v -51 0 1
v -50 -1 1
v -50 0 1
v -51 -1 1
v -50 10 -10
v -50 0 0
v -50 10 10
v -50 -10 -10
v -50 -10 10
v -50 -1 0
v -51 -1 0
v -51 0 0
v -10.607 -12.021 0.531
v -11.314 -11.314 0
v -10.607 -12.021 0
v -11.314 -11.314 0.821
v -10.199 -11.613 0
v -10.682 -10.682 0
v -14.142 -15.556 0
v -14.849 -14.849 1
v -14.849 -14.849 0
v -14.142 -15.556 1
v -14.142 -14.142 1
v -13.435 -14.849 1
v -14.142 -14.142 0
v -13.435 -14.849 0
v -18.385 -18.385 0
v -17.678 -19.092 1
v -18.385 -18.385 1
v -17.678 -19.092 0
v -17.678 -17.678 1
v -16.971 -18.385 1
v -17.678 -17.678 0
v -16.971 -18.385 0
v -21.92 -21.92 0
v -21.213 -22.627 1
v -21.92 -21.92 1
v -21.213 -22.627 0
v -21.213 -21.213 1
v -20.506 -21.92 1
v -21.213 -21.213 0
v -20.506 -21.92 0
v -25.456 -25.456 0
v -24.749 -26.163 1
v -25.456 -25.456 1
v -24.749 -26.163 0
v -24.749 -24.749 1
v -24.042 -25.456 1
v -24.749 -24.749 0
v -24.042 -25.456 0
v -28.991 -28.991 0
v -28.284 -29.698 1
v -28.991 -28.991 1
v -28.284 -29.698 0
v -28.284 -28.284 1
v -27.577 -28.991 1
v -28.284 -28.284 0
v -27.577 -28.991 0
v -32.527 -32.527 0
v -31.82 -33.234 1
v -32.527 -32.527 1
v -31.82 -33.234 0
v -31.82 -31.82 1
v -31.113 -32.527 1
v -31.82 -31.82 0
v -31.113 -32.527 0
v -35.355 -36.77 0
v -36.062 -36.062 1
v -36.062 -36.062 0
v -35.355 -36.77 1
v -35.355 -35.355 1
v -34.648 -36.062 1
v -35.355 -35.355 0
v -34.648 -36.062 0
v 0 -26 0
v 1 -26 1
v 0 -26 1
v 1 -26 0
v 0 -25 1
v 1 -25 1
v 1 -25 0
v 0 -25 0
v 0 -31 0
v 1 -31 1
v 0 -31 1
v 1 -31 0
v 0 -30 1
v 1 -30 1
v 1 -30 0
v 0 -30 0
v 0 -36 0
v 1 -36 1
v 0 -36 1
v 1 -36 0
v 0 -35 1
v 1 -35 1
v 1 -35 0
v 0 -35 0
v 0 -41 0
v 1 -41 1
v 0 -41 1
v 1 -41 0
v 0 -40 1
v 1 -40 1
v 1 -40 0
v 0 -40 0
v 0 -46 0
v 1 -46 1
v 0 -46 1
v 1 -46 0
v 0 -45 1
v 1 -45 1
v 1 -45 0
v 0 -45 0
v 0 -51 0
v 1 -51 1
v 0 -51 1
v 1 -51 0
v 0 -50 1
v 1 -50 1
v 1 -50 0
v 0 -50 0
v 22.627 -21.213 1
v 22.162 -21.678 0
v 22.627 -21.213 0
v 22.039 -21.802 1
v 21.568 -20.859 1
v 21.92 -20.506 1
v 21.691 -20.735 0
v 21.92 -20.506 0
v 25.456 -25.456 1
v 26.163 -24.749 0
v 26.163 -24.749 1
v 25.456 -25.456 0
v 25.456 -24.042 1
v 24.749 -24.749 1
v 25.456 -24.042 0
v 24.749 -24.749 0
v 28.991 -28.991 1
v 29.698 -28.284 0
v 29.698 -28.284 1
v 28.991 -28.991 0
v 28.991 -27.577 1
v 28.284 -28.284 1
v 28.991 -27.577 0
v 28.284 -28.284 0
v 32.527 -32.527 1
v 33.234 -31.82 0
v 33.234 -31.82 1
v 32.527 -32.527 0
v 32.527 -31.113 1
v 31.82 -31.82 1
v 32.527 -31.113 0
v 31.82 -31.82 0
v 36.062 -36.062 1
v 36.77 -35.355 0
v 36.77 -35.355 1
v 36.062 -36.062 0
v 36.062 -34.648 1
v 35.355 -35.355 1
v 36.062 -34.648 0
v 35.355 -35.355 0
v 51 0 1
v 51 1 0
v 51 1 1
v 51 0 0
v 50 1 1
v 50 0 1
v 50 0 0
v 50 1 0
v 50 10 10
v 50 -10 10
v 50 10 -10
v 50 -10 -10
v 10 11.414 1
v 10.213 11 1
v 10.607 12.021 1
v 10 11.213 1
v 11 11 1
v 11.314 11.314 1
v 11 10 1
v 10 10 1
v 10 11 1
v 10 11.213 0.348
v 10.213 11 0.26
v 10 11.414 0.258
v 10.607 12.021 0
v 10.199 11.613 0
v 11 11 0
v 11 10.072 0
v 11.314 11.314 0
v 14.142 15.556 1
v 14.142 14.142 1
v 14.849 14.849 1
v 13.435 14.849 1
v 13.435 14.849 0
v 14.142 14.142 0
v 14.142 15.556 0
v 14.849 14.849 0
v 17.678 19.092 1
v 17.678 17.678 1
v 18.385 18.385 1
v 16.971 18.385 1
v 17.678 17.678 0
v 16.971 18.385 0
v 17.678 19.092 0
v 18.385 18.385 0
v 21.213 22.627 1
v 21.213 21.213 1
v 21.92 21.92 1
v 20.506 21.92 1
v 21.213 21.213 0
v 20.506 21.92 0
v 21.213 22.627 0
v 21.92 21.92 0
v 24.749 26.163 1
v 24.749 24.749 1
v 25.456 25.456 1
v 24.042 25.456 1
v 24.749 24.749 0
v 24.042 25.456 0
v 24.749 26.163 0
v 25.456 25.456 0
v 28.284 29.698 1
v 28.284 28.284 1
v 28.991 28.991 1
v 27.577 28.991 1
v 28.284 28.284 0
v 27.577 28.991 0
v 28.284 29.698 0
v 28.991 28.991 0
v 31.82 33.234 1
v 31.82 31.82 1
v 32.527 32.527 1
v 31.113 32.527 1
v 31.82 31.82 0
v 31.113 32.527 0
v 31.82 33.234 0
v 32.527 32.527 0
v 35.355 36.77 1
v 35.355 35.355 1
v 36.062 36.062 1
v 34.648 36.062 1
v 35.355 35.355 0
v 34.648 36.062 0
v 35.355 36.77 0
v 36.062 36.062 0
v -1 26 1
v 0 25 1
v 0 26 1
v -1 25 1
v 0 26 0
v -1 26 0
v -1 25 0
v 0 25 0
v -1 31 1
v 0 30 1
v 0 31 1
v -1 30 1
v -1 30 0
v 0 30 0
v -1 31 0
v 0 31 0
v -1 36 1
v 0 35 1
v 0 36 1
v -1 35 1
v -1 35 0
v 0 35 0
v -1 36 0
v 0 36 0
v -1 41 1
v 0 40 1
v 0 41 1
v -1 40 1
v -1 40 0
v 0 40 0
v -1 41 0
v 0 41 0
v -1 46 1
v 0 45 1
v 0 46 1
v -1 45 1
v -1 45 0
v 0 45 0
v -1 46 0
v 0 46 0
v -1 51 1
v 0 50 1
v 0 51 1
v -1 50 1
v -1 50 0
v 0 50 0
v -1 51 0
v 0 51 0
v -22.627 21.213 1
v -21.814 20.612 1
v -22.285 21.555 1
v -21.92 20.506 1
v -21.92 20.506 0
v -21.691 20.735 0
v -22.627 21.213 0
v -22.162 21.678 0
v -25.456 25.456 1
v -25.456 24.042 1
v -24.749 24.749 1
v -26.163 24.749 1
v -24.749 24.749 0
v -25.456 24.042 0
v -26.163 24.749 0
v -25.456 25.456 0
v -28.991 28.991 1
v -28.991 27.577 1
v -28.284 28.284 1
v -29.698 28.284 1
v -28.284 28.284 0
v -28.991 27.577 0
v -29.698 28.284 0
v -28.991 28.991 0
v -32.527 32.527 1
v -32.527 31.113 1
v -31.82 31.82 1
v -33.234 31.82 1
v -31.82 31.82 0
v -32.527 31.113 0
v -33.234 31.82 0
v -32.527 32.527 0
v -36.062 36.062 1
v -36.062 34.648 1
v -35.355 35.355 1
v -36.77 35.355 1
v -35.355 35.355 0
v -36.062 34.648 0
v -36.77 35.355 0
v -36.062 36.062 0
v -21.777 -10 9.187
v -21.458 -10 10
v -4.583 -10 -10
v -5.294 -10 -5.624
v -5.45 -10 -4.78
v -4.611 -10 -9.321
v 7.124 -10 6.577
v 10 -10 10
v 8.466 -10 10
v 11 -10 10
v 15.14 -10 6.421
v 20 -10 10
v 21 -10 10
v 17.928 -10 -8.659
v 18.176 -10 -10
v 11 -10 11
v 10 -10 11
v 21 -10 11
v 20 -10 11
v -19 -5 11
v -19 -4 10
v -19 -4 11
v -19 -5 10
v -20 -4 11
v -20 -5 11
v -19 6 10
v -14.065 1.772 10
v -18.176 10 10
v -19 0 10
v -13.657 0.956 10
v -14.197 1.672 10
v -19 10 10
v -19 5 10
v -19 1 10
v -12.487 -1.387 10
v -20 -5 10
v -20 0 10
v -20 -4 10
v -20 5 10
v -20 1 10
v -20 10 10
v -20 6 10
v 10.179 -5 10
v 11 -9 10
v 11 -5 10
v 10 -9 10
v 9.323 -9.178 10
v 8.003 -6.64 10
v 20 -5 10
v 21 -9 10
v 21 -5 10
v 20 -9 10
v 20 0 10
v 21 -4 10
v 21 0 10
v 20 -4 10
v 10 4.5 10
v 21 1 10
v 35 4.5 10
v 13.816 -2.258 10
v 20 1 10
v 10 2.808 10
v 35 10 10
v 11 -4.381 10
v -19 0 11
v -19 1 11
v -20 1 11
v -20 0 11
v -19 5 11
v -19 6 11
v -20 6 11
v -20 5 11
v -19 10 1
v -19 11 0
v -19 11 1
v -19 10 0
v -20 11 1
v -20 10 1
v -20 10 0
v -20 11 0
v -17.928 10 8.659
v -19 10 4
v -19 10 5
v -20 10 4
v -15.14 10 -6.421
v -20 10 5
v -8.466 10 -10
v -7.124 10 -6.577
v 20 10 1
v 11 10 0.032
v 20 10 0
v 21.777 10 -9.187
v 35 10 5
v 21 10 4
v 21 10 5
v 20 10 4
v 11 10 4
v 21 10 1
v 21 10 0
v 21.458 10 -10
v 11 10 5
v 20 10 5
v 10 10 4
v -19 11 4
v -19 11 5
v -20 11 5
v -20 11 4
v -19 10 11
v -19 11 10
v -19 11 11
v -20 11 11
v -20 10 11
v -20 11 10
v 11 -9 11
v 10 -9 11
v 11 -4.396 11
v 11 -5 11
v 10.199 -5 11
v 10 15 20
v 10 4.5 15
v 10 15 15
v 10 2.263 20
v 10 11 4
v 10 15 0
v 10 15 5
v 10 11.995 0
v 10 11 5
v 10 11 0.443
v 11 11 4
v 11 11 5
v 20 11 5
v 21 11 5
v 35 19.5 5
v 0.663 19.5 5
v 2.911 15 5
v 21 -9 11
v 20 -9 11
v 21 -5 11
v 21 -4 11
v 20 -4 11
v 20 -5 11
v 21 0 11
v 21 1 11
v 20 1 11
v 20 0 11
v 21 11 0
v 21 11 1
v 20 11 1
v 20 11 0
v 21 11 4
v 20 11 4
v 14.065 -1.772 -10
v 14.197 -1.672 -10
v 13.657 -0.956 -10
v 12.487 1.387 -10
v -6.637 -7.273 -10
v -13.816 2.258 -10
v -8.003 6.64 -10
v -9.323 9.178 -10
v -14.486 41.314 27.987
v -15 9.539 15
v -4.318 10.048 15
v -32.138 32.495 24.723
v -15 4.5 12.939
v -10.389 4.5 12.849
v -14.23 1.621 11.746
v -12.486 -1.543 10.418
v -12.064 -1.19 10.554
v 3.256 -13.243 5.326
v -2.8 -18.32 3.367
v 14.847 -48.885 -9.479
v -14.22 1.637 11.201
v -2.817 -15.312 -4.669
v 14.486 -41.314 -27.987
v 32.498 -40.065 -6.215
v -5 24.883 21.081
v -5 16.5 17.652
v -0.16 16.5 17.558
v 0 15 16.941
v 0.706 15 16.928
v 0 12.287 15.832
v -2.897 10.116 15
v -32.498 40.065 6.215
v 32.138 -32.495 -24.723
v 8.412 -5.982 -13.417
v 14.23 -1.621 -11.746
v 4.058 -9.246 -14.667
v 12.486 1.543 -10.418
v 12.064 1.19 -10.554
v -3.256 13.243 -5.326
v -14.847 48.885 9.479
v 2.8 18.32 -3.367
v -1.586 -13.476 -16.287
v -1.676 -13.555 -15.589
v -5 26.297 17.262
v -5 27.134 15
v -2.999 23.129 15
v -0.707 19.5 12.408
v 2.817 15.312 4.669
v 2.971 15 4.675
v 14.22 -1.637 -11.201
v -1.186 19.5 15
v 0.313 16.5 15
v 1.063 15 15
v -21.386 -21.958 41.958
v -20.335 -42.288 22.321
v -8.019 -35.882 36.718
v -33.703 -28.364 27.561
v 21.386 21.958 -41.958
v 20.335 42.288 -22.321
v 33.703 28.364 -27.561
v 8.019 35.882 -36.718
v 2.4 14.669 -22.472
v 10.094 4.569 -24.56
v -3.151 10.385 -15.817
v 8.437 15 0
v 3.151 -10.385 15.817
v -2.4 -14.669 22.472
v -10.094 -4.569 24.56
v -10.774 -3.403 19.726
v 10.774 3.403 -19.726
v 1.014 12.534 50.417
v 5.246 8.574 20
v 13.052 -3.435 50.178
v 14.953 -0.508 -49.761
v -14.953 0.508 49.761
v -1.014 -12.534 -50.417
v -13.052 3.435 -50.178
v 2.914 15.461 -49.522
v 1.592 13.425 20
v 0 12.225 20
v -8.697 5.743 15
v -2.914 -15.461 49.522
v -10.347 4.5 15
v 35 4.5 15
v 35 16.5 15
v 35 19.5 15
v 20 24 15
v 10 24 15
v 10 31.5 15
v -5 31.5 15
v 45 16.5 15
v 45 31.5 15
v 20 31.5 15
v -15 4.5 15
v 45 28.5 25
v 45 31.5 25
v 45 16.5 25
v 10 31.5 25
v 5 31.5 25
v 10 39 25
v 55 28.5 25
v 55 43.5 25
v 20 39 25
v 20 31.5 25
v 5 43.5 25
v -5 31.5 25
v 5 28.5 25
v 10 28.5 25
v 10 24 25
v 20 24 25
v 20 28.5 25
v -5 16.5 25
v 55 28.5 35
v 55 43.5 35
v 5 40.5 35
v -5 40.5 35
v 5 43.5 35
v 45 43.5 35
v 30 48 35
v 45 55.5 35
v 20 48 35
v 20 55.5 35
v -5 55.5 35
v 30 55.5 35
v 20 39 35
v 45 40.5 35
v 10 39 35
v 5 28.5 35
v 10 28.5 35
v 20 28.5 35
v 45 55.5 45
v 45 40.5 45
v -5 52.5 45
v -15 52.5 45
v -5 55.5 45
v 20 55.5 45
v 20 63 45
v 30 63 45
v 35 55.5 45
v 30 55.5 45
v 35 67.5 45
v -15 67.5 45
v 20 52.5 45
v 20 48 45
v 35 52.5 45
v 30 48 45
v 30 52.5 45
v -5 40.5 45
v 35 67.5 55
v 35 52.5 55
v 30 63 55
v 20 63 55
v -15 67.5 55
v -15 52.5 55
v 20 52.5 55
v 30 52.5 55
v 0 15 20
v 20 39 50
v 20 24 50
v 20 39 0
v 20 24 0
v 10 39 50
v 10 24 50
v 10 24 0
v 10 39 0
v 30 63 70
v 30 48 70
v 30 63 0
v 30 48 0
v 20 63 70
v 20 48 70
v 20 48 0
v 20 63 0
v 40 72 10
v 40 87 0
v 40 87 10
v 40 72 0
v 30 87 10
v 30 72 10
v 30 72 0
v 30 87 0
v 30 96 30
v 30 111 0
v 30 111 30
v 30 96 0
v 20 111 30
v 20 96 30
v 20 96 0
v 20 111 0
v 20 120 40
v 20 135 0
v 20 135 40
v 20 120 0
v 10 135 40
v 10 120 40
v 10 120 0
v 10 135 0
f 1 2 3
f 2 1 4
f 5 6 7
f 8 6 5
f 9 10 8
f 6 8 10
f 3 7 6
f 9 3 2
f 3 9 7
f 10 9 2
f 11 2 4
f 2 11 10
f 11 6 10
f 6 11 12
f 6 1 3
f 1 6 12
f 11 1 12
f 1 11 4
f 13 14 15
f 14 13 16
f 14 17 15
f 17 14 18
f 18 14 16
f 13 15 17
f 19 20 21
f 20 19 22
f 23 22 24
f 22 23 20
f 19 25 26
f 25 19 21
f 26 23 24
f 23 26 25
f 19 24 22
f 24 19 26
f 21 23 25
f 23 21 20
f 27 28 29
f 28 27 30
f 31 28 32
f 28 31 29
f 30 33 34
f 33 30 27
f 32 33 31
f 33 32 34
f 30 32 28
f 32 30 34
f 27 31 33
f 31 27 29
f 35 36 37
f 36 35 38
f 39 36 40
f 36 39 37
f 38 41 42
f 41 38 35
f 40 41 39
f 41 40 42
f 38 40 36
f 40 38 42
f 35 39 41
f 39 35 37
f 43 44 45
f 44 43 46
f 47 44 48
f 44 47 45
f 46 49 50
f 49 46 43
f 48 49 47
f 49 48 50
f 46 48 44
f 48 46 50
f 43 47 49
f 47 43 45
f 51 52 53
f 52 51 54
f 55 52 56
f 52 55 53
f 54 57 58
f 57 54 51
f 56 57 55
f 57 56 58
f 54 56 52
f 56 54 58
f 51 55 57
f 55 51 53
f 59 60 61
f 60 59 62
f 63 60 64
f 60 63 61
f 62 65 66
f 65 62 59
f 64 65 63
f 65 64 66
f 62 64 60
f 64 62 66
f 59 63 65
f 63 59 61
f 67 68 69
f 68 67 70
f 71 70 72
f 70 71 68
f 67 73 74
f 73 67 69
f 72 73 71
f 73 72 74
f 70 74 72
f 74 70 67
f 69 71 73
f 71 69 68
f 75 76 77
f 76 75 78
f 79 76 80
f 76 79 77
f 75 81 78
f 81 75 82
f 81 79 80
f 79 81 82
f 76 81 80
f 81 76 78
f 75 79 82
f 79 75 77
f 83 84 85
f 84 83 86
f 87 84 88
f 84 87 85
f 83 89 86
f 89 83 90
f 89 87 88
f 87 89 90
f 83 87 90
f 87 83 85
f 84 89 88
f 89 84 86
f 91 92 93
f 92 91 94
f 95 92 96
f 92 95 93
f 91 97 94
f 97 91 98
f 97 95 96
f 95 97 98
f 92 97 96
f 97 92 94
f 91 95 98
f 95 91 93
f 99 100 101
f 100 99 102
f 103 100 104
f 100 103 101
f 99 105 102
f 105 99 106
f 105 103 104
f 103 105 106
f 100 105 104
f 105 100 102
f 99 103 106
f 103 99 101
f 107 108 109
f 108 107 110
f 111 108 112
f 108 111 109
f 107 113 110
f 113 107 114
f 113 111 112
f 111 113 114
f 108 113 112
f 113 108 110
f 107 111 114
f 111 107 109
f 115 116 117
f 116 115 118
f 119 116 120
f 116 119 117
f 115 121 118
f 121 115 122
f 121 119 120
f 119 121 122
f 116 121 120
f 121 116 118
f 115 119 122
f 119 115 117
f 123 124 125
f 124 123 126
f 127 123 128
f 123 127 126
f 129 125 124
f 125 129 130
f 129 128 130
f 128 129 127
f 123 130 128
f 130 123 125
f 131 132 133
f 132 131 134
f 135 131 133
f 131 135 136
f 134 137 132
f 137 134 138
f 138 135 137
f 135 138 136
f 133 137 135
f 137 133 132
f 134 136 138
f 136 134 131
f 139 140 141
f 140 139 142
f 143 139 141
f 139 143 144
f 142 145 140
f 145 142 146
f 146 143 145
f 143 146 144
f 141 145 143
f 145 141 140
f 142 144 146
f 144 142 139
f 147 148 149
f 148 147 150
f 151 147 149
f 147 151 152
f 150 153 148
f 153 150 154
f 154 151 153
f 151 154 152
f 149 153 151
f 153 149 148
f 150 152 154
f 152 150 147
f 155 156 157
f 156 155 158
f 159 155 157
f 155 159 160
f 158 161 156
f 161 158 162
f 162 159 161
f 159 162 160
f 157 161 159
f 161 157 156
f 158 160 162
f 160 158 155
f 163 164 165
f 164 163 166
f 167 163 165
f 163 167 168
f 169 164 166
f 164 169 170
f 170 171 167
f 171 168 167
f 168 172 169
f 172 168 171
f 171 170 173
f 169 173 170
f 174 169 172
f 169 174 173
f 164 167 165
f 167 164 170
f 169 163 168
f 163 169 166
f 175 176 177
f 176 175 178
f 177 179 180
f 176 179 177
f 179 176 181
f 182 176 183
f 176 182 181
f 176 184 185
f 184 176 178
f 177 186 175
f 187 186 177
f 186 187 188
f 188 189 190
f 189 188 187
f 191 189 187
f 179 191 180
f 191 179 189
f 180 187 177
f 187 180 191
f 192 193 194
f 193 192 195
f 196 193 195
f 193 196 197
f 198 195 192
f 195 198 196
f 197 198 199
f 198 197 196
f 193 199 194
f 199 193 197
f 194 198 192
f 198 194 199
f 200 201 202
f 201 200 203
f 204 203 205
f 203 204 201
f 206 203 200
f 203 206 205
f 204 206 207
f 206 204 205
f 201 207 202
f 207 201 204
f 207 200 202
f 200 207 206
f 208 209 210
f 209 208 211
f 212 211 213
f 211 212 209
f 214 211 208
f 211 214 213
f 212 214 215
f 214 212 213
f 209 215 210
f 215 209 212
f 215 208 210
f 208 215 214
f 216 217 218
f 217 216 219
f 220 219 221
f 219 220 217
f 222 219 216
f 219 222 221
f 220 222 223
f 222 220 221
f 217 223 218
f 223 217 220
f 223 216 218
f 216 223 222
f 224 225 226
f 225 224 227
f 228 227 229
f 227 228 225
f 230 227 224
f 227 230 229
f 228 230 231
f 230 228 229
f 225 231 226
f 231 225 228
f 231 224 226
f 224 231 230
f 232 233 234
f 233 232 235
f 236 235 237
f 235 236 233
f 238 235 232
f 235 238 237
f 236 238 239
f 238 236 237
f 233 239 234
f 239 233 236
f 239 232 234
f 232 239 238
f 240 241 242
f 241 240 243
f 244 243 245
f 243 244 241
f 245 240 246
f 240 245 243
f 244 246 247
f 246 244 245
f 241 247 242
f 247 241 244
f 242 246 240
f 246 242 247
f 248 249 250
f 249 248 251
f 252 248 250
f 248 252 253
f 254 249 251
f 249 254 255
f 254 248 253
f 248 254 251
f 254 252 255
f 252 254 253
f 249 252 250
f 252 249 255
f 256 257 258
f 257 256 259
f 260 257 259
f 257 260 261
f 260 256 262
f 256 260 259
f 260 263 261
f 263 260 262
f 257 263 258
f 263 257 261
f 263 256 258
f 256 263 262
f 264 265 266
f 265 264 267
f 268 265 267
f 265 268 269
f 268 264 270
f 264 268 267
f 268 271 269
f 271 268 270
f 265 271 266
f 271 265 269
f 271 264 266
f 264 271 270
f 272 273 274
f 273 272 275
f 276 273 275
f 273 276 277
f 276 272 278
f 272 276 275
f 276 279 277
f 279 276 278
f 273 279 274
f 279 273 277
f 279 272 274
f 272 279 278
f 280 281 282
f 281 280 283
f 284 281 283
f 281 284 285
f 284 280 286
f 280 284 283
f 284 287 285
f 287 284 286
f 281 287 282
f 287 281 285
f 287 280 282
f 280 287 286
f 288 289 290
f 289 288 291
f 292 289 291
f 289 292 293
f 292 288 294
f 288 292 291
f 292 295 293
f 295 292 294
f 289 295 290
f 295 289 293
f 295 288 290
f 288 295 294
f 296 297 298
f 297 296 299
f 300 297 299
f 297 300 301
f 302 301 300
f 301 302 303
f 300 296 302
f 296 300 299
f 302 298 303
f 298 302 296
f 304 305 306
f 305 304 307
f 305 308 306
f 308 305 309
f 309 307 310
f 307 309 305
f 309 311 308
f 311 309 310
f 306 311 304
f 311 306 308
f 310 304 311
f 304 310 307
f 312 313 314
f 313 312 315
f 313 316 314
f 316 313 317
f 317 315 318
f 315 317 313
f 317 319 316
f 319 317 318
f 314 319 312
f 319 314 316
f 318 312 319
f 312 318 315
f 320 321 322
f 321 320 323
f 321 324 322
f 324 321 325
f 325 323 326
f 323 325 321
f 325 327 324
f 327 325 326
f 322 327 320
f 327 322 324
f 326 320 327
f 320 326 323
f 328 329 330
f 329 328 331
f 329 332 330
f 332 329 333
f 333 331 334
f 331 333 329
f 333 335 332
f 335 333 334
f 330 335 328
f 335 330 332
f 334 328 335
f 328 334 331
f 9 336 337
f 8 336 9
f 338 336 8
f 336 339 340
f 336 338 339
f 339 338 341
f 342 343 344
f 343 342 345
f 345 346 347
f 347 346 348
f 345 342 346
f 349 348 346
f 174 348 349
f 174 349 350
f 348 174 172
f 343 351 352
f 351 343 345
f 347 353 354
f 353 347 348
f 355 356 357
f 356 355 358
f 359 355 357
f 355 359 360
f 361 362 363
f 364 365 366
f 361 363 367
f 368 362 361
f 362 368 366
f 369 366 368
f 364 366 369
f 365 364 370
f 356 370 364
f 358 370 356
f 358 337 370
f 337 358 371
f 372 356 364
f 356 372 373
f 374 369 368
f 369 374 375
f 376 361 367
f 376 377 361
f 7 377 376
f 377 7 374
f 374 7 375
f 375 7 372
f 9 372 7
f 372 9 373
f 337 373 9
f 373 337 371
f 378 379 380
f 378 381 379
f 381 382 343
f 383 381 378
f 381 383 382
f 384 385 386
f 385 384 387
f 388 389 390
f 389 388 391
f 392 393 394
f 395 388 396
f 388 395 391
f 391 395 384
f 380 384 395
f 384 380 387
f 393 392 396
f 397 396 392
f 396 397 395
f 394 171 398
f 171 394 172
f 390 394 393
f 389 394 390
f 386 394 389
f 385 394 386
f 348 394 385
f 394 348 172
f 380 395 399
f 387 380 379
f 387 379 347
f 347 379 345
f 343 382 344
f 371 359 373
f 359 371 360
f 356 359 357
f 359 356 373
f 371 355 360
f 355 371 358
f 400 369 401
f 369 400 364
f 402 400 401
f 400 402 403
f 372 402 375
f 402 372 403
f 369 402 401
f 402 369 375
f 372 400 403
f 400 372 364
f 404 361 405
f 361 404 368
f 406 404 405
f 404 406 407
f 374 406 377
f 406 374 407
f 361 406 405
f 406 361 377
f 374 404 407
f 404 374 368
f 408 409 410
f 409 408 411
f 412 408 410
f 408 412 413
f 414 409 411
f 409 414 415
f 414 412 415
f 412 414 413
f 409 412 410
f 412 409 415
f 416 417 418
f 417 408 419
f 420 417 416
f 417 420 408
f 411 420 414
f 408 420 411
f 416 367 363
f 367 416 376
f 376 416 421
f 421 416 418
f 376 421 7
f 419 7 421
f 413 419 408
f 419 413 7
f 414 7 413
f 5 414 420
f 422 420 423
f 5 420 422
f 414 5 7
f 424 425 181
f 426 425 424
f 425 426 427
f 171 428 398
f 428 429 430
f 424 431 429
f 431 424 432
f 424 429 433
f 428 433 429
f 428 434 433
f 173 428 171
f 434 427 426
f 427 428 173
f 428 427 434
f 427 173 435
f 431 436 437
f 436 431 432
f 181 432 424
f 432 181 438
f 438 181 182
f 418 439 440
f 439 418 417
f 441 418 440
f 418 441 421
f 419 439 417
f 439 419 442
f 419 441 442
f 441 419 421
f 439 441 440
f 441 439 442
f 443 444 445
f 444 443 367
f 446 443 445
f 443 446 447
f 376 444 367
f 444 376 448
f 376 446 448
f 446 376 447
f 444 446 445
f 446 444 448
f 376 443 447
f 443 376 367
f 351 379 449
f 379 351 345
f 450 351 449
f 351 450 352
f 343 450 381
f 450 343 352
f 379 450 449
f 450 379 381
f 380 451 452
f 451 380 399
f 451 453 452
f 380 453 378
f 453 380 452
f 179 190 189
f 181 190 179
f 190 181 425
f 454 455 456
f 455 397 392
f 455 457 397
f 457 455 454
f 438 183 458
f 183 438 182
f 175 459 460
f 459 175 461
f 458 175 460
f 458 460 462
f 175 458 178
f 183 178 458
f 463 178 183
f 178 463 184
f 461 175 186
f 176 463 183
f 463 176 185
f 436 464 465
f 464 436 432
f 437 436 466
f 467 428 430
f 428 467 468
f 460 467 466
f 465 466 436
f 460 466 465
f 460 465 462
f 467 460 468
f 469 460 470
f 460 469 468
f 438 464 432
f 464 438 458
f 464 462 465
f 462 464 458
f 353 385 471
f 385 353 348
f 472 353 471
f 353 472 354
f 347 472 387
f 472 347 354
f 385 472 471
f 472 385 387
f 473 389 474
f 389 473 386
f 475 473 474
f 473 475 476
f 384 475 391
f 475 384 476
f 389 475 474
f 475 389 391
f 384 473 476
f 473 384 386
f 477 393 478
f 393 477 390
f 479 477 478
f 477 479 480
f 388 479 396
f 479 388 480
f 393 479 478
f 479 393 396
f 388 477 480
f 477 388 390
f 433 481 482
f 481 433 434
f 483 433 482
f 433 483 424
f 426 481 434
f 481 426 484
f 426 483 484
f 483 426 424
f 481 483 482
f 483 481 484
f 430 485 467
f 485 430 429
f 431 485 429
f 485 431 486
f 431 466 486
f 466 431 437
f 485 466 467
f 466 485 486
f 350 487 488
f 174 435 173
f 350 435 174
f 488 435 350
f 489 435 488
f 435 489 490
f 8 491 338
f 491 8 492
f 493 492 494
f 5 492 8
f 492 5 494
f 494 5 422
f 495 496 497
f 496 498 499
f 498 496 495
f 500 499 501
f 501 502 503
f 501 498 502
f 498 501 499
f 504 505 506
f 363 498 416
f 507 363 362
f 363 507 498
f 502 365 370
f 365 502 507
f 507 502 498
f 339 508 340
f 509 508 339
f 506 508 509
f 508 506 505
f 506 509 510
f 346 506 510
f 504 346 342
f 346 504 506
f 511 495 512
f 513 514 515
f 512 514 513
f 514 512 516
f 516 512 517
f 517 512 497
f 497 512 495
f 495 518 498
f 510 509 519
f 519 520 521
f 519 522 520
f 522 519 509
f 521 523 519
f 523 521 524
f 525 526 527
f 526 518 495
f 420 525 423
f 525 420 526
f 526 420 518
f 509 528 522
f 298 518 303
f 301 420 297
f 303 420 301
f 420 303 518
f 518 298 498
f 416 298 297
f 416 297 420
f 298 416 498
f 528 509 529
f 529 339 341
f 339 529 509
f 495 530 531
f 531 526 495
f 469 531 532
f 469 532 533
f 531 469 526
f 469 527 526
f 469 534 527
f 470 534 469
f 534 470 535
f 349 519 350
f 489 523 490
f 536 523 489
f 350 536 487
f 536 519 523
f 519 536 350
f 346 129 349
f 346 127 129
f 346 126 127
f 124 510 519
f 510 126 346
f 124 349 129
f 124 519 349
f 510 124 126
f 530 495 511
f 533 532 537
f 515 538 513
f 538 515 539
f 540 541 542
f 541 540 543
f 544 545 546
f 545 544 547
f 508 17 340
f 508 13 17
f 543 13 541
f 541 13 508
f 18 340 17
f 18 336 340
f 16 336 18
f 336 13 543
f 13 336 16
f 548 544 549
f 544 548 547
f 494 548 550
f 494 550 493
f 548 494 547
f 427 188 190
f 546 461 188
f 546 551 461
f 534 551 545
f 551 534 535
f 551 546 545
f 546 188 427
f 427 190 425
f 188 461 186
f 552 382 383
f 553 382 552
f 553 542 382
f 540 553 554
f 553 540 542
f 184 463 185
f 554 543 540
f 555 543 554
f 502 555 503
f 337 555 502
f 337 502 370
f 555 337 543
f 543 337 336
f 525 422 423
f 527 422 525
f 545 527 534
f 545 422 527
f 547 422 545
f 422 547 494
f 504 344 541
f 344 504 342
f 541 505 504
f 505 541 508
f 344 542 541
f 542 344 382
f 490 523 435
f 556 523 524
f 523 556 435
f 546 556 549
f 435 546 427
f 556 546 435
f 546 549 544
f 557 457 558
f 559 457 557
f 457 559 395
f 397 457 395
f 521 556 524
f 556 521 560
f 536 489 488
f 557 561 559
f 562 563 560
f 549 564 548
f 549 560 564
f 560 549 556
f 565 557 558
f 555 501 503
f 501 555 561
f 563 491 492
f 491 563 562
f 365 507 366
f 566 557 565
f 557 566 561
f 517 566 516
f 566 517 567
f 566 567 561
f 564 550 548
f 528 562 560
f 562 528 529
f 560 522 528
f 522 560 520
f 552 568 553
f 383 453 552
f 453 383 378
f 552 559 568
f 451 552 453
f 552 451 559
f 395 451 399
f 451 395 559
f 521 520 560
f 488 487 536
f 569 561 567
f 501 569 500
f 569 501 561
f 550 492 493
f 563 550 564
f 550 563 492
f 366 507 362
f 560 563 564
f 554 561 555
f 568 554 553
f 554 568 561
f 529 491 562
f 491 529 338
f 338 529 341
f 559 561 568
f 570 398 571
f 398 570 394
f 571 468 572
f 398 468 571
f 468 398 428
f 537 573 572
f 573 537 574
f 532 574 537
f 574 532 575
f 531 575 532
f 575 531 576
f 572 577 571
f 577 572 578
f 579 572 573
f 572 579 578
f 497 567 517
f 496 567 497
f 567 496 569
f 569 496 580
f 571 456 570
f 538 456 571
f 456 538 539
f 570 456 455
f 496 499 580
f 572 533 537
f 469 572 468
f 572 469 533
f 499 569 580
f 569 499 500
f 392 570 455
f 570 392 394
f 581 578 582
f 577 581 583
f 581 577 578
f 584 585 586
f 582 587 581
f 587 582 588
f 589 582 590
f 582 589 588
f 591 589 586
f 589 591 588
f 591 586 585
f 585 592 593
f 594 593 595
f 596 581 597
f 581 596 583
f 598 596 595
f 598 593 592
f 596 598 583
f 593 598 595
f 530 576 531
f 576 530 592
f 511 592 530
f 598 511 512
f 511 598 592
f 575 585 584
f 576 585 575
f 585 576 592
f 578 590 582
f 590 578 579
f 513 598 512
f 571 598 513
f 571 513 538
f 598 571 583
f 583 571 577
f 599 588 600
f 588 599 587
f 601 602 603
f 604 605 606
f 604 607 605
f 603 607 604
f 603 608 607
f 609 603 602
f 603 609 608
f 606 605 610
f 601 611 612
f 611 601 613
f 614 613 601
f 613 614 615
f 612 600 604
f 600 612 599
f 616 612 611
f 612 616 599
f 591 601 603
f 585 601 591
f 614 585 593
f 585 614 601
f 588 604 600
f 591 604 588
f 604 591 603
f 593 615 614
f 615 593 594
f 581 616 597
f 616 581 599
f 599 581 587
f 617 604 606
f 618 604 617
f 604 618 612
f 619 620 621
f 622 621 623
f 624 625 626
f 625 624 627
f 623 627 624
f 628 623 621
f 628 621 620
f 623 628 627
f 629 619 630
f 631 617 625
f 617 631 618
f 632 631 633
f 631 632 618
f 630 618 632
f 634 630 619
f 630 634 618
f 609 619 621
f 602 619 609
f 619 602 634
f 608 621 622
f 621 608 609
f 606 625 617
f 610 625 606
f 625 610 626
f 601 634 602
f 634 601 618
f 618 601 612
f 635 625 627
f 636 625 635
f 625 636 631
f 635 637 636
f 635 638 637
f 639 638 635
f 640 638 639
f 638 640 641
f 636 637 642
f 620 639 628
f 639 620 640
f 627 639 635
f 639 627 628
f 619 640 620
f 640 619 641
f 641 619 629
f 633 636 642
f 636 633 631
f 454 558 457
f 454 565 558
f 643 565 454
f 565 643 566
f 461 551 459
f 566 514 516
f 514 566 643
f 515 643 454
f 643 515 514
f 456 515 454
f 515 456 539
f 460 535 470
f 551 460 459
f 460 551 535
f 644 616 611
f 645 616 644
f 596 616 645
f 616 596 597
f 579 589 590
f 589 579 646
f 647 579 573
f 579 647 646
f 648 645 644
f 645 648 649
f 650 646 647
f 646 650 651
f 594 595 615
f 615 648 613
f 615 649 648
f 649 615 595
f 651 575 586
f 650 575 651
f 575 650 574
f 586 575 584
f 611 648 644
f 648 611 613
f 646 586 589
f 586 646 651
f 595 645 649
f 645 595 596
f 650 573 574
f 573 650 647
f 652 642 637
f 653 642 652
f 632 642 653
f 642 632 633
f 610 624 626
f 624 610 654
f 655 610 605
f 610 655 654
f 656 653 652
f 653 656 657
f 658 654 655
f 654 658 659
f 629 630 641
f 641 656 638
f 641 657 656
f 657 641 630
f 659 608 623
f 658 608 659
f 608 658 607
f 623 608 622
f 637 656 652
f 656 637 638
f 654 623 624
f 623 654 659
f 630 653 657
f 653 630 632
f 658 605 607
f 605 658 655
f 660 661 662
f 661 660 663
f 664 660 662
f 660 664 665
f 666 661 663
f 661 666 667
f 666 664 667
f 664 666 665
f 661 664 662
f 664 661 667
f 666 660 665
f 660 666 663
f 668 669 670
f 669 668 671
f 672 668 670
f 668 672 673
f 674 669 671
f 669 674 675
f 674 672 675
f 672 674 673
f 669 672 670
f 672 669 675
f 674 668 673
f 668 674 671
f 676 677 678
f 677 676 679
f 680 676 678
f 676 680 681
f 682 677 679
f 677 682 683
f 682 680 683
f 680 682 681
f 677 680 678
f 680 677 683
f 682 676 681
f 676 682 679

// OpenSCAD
for (a =[3:5])echo(a);     // 3 4 5
for (a =[3:0]){echo(a);}   // 0 1 2 3         start > end is invalid, deprecated by 2015.3
for (a =[3:0.5:5])echo(a); // 3 3.5 4 4.5 5
for (a =[0:2:5])echo(a);   // 0 2 4
for (a =[3:-2:-1])echo(a); // 3 1 -1

for (a =[3,4,1,5])echo(a); // 3 4 1 5
for (a =[0.3,PI,1,99]){echo(a);}    // 0.3 3.14159 1 99
x1=2; x2=8; x3=5.5;
for (a =[x1,x2,x3]){echo(a);} // 2 8 5.5
for (a =[[1,2],6,"s",[[3,4],[5,6]]])echo(a);  // [1,2] 6 "s" [[3,4],[5,6]]

animals = ["elephants", "snakes", "tigers", "giraffes"];
for(animal = animals)
echo(str("I've been to the zoo and saw ", animal)); // "I've been to the zoo and saw elephants", for each animal

for (i=[0:3])
translate([i*10,0,0])
    cube(i+1);

for(z=[-180:45:+180])
for(x=[10:5:50])
rotate([0,0,z]) translate([x,0,0]) cube(1);

color_vec = ["black","red","blue","green","pink","purple"];
for (x = [-20:10:20] )
for (y = [0:4] )color(color_vec[y])
    for (z = [0,4,10] )
    {translate([x,y*5-10,z])cube();}

color_vec = ["black","red","blue","green","pink","purple"];
for (x = [-20:10:20],
y = [0:4],
z = [0,4,10] )
translate([x,y*5-10,z]){color(color_vec[y])cube();}

for(i = [ [  0,  0,   0],
        [ 10, 20, 300],
        [200, 40,  57],
        [ 20, 88,  57] ])
{
    rotate(i)
        cube([100, 20, 20], center = true);
}

for(i = [ [ 0,  0,  0],
        [10, 12, 10],
        [20, 24, 20],
        [30, 36, 30],
        [20, 48, 40],
        [10, 60, 50] ])
{
    translate(i)
        cube([50, 15, 10], center = true);
}

for(i = [ [[ 0,  0,  0], 20],
        [[10, 12, 10], 50],
        [[20, 24, 20], 70],
        [[30, 36, 30], 10],
        [[20, 48, 40], 30],
        [[10, 60, 50], 40] ])
{
    translate([i[0][0], 2*i[0][1], 0])
        cube([10, 15, i[1]]);
}
